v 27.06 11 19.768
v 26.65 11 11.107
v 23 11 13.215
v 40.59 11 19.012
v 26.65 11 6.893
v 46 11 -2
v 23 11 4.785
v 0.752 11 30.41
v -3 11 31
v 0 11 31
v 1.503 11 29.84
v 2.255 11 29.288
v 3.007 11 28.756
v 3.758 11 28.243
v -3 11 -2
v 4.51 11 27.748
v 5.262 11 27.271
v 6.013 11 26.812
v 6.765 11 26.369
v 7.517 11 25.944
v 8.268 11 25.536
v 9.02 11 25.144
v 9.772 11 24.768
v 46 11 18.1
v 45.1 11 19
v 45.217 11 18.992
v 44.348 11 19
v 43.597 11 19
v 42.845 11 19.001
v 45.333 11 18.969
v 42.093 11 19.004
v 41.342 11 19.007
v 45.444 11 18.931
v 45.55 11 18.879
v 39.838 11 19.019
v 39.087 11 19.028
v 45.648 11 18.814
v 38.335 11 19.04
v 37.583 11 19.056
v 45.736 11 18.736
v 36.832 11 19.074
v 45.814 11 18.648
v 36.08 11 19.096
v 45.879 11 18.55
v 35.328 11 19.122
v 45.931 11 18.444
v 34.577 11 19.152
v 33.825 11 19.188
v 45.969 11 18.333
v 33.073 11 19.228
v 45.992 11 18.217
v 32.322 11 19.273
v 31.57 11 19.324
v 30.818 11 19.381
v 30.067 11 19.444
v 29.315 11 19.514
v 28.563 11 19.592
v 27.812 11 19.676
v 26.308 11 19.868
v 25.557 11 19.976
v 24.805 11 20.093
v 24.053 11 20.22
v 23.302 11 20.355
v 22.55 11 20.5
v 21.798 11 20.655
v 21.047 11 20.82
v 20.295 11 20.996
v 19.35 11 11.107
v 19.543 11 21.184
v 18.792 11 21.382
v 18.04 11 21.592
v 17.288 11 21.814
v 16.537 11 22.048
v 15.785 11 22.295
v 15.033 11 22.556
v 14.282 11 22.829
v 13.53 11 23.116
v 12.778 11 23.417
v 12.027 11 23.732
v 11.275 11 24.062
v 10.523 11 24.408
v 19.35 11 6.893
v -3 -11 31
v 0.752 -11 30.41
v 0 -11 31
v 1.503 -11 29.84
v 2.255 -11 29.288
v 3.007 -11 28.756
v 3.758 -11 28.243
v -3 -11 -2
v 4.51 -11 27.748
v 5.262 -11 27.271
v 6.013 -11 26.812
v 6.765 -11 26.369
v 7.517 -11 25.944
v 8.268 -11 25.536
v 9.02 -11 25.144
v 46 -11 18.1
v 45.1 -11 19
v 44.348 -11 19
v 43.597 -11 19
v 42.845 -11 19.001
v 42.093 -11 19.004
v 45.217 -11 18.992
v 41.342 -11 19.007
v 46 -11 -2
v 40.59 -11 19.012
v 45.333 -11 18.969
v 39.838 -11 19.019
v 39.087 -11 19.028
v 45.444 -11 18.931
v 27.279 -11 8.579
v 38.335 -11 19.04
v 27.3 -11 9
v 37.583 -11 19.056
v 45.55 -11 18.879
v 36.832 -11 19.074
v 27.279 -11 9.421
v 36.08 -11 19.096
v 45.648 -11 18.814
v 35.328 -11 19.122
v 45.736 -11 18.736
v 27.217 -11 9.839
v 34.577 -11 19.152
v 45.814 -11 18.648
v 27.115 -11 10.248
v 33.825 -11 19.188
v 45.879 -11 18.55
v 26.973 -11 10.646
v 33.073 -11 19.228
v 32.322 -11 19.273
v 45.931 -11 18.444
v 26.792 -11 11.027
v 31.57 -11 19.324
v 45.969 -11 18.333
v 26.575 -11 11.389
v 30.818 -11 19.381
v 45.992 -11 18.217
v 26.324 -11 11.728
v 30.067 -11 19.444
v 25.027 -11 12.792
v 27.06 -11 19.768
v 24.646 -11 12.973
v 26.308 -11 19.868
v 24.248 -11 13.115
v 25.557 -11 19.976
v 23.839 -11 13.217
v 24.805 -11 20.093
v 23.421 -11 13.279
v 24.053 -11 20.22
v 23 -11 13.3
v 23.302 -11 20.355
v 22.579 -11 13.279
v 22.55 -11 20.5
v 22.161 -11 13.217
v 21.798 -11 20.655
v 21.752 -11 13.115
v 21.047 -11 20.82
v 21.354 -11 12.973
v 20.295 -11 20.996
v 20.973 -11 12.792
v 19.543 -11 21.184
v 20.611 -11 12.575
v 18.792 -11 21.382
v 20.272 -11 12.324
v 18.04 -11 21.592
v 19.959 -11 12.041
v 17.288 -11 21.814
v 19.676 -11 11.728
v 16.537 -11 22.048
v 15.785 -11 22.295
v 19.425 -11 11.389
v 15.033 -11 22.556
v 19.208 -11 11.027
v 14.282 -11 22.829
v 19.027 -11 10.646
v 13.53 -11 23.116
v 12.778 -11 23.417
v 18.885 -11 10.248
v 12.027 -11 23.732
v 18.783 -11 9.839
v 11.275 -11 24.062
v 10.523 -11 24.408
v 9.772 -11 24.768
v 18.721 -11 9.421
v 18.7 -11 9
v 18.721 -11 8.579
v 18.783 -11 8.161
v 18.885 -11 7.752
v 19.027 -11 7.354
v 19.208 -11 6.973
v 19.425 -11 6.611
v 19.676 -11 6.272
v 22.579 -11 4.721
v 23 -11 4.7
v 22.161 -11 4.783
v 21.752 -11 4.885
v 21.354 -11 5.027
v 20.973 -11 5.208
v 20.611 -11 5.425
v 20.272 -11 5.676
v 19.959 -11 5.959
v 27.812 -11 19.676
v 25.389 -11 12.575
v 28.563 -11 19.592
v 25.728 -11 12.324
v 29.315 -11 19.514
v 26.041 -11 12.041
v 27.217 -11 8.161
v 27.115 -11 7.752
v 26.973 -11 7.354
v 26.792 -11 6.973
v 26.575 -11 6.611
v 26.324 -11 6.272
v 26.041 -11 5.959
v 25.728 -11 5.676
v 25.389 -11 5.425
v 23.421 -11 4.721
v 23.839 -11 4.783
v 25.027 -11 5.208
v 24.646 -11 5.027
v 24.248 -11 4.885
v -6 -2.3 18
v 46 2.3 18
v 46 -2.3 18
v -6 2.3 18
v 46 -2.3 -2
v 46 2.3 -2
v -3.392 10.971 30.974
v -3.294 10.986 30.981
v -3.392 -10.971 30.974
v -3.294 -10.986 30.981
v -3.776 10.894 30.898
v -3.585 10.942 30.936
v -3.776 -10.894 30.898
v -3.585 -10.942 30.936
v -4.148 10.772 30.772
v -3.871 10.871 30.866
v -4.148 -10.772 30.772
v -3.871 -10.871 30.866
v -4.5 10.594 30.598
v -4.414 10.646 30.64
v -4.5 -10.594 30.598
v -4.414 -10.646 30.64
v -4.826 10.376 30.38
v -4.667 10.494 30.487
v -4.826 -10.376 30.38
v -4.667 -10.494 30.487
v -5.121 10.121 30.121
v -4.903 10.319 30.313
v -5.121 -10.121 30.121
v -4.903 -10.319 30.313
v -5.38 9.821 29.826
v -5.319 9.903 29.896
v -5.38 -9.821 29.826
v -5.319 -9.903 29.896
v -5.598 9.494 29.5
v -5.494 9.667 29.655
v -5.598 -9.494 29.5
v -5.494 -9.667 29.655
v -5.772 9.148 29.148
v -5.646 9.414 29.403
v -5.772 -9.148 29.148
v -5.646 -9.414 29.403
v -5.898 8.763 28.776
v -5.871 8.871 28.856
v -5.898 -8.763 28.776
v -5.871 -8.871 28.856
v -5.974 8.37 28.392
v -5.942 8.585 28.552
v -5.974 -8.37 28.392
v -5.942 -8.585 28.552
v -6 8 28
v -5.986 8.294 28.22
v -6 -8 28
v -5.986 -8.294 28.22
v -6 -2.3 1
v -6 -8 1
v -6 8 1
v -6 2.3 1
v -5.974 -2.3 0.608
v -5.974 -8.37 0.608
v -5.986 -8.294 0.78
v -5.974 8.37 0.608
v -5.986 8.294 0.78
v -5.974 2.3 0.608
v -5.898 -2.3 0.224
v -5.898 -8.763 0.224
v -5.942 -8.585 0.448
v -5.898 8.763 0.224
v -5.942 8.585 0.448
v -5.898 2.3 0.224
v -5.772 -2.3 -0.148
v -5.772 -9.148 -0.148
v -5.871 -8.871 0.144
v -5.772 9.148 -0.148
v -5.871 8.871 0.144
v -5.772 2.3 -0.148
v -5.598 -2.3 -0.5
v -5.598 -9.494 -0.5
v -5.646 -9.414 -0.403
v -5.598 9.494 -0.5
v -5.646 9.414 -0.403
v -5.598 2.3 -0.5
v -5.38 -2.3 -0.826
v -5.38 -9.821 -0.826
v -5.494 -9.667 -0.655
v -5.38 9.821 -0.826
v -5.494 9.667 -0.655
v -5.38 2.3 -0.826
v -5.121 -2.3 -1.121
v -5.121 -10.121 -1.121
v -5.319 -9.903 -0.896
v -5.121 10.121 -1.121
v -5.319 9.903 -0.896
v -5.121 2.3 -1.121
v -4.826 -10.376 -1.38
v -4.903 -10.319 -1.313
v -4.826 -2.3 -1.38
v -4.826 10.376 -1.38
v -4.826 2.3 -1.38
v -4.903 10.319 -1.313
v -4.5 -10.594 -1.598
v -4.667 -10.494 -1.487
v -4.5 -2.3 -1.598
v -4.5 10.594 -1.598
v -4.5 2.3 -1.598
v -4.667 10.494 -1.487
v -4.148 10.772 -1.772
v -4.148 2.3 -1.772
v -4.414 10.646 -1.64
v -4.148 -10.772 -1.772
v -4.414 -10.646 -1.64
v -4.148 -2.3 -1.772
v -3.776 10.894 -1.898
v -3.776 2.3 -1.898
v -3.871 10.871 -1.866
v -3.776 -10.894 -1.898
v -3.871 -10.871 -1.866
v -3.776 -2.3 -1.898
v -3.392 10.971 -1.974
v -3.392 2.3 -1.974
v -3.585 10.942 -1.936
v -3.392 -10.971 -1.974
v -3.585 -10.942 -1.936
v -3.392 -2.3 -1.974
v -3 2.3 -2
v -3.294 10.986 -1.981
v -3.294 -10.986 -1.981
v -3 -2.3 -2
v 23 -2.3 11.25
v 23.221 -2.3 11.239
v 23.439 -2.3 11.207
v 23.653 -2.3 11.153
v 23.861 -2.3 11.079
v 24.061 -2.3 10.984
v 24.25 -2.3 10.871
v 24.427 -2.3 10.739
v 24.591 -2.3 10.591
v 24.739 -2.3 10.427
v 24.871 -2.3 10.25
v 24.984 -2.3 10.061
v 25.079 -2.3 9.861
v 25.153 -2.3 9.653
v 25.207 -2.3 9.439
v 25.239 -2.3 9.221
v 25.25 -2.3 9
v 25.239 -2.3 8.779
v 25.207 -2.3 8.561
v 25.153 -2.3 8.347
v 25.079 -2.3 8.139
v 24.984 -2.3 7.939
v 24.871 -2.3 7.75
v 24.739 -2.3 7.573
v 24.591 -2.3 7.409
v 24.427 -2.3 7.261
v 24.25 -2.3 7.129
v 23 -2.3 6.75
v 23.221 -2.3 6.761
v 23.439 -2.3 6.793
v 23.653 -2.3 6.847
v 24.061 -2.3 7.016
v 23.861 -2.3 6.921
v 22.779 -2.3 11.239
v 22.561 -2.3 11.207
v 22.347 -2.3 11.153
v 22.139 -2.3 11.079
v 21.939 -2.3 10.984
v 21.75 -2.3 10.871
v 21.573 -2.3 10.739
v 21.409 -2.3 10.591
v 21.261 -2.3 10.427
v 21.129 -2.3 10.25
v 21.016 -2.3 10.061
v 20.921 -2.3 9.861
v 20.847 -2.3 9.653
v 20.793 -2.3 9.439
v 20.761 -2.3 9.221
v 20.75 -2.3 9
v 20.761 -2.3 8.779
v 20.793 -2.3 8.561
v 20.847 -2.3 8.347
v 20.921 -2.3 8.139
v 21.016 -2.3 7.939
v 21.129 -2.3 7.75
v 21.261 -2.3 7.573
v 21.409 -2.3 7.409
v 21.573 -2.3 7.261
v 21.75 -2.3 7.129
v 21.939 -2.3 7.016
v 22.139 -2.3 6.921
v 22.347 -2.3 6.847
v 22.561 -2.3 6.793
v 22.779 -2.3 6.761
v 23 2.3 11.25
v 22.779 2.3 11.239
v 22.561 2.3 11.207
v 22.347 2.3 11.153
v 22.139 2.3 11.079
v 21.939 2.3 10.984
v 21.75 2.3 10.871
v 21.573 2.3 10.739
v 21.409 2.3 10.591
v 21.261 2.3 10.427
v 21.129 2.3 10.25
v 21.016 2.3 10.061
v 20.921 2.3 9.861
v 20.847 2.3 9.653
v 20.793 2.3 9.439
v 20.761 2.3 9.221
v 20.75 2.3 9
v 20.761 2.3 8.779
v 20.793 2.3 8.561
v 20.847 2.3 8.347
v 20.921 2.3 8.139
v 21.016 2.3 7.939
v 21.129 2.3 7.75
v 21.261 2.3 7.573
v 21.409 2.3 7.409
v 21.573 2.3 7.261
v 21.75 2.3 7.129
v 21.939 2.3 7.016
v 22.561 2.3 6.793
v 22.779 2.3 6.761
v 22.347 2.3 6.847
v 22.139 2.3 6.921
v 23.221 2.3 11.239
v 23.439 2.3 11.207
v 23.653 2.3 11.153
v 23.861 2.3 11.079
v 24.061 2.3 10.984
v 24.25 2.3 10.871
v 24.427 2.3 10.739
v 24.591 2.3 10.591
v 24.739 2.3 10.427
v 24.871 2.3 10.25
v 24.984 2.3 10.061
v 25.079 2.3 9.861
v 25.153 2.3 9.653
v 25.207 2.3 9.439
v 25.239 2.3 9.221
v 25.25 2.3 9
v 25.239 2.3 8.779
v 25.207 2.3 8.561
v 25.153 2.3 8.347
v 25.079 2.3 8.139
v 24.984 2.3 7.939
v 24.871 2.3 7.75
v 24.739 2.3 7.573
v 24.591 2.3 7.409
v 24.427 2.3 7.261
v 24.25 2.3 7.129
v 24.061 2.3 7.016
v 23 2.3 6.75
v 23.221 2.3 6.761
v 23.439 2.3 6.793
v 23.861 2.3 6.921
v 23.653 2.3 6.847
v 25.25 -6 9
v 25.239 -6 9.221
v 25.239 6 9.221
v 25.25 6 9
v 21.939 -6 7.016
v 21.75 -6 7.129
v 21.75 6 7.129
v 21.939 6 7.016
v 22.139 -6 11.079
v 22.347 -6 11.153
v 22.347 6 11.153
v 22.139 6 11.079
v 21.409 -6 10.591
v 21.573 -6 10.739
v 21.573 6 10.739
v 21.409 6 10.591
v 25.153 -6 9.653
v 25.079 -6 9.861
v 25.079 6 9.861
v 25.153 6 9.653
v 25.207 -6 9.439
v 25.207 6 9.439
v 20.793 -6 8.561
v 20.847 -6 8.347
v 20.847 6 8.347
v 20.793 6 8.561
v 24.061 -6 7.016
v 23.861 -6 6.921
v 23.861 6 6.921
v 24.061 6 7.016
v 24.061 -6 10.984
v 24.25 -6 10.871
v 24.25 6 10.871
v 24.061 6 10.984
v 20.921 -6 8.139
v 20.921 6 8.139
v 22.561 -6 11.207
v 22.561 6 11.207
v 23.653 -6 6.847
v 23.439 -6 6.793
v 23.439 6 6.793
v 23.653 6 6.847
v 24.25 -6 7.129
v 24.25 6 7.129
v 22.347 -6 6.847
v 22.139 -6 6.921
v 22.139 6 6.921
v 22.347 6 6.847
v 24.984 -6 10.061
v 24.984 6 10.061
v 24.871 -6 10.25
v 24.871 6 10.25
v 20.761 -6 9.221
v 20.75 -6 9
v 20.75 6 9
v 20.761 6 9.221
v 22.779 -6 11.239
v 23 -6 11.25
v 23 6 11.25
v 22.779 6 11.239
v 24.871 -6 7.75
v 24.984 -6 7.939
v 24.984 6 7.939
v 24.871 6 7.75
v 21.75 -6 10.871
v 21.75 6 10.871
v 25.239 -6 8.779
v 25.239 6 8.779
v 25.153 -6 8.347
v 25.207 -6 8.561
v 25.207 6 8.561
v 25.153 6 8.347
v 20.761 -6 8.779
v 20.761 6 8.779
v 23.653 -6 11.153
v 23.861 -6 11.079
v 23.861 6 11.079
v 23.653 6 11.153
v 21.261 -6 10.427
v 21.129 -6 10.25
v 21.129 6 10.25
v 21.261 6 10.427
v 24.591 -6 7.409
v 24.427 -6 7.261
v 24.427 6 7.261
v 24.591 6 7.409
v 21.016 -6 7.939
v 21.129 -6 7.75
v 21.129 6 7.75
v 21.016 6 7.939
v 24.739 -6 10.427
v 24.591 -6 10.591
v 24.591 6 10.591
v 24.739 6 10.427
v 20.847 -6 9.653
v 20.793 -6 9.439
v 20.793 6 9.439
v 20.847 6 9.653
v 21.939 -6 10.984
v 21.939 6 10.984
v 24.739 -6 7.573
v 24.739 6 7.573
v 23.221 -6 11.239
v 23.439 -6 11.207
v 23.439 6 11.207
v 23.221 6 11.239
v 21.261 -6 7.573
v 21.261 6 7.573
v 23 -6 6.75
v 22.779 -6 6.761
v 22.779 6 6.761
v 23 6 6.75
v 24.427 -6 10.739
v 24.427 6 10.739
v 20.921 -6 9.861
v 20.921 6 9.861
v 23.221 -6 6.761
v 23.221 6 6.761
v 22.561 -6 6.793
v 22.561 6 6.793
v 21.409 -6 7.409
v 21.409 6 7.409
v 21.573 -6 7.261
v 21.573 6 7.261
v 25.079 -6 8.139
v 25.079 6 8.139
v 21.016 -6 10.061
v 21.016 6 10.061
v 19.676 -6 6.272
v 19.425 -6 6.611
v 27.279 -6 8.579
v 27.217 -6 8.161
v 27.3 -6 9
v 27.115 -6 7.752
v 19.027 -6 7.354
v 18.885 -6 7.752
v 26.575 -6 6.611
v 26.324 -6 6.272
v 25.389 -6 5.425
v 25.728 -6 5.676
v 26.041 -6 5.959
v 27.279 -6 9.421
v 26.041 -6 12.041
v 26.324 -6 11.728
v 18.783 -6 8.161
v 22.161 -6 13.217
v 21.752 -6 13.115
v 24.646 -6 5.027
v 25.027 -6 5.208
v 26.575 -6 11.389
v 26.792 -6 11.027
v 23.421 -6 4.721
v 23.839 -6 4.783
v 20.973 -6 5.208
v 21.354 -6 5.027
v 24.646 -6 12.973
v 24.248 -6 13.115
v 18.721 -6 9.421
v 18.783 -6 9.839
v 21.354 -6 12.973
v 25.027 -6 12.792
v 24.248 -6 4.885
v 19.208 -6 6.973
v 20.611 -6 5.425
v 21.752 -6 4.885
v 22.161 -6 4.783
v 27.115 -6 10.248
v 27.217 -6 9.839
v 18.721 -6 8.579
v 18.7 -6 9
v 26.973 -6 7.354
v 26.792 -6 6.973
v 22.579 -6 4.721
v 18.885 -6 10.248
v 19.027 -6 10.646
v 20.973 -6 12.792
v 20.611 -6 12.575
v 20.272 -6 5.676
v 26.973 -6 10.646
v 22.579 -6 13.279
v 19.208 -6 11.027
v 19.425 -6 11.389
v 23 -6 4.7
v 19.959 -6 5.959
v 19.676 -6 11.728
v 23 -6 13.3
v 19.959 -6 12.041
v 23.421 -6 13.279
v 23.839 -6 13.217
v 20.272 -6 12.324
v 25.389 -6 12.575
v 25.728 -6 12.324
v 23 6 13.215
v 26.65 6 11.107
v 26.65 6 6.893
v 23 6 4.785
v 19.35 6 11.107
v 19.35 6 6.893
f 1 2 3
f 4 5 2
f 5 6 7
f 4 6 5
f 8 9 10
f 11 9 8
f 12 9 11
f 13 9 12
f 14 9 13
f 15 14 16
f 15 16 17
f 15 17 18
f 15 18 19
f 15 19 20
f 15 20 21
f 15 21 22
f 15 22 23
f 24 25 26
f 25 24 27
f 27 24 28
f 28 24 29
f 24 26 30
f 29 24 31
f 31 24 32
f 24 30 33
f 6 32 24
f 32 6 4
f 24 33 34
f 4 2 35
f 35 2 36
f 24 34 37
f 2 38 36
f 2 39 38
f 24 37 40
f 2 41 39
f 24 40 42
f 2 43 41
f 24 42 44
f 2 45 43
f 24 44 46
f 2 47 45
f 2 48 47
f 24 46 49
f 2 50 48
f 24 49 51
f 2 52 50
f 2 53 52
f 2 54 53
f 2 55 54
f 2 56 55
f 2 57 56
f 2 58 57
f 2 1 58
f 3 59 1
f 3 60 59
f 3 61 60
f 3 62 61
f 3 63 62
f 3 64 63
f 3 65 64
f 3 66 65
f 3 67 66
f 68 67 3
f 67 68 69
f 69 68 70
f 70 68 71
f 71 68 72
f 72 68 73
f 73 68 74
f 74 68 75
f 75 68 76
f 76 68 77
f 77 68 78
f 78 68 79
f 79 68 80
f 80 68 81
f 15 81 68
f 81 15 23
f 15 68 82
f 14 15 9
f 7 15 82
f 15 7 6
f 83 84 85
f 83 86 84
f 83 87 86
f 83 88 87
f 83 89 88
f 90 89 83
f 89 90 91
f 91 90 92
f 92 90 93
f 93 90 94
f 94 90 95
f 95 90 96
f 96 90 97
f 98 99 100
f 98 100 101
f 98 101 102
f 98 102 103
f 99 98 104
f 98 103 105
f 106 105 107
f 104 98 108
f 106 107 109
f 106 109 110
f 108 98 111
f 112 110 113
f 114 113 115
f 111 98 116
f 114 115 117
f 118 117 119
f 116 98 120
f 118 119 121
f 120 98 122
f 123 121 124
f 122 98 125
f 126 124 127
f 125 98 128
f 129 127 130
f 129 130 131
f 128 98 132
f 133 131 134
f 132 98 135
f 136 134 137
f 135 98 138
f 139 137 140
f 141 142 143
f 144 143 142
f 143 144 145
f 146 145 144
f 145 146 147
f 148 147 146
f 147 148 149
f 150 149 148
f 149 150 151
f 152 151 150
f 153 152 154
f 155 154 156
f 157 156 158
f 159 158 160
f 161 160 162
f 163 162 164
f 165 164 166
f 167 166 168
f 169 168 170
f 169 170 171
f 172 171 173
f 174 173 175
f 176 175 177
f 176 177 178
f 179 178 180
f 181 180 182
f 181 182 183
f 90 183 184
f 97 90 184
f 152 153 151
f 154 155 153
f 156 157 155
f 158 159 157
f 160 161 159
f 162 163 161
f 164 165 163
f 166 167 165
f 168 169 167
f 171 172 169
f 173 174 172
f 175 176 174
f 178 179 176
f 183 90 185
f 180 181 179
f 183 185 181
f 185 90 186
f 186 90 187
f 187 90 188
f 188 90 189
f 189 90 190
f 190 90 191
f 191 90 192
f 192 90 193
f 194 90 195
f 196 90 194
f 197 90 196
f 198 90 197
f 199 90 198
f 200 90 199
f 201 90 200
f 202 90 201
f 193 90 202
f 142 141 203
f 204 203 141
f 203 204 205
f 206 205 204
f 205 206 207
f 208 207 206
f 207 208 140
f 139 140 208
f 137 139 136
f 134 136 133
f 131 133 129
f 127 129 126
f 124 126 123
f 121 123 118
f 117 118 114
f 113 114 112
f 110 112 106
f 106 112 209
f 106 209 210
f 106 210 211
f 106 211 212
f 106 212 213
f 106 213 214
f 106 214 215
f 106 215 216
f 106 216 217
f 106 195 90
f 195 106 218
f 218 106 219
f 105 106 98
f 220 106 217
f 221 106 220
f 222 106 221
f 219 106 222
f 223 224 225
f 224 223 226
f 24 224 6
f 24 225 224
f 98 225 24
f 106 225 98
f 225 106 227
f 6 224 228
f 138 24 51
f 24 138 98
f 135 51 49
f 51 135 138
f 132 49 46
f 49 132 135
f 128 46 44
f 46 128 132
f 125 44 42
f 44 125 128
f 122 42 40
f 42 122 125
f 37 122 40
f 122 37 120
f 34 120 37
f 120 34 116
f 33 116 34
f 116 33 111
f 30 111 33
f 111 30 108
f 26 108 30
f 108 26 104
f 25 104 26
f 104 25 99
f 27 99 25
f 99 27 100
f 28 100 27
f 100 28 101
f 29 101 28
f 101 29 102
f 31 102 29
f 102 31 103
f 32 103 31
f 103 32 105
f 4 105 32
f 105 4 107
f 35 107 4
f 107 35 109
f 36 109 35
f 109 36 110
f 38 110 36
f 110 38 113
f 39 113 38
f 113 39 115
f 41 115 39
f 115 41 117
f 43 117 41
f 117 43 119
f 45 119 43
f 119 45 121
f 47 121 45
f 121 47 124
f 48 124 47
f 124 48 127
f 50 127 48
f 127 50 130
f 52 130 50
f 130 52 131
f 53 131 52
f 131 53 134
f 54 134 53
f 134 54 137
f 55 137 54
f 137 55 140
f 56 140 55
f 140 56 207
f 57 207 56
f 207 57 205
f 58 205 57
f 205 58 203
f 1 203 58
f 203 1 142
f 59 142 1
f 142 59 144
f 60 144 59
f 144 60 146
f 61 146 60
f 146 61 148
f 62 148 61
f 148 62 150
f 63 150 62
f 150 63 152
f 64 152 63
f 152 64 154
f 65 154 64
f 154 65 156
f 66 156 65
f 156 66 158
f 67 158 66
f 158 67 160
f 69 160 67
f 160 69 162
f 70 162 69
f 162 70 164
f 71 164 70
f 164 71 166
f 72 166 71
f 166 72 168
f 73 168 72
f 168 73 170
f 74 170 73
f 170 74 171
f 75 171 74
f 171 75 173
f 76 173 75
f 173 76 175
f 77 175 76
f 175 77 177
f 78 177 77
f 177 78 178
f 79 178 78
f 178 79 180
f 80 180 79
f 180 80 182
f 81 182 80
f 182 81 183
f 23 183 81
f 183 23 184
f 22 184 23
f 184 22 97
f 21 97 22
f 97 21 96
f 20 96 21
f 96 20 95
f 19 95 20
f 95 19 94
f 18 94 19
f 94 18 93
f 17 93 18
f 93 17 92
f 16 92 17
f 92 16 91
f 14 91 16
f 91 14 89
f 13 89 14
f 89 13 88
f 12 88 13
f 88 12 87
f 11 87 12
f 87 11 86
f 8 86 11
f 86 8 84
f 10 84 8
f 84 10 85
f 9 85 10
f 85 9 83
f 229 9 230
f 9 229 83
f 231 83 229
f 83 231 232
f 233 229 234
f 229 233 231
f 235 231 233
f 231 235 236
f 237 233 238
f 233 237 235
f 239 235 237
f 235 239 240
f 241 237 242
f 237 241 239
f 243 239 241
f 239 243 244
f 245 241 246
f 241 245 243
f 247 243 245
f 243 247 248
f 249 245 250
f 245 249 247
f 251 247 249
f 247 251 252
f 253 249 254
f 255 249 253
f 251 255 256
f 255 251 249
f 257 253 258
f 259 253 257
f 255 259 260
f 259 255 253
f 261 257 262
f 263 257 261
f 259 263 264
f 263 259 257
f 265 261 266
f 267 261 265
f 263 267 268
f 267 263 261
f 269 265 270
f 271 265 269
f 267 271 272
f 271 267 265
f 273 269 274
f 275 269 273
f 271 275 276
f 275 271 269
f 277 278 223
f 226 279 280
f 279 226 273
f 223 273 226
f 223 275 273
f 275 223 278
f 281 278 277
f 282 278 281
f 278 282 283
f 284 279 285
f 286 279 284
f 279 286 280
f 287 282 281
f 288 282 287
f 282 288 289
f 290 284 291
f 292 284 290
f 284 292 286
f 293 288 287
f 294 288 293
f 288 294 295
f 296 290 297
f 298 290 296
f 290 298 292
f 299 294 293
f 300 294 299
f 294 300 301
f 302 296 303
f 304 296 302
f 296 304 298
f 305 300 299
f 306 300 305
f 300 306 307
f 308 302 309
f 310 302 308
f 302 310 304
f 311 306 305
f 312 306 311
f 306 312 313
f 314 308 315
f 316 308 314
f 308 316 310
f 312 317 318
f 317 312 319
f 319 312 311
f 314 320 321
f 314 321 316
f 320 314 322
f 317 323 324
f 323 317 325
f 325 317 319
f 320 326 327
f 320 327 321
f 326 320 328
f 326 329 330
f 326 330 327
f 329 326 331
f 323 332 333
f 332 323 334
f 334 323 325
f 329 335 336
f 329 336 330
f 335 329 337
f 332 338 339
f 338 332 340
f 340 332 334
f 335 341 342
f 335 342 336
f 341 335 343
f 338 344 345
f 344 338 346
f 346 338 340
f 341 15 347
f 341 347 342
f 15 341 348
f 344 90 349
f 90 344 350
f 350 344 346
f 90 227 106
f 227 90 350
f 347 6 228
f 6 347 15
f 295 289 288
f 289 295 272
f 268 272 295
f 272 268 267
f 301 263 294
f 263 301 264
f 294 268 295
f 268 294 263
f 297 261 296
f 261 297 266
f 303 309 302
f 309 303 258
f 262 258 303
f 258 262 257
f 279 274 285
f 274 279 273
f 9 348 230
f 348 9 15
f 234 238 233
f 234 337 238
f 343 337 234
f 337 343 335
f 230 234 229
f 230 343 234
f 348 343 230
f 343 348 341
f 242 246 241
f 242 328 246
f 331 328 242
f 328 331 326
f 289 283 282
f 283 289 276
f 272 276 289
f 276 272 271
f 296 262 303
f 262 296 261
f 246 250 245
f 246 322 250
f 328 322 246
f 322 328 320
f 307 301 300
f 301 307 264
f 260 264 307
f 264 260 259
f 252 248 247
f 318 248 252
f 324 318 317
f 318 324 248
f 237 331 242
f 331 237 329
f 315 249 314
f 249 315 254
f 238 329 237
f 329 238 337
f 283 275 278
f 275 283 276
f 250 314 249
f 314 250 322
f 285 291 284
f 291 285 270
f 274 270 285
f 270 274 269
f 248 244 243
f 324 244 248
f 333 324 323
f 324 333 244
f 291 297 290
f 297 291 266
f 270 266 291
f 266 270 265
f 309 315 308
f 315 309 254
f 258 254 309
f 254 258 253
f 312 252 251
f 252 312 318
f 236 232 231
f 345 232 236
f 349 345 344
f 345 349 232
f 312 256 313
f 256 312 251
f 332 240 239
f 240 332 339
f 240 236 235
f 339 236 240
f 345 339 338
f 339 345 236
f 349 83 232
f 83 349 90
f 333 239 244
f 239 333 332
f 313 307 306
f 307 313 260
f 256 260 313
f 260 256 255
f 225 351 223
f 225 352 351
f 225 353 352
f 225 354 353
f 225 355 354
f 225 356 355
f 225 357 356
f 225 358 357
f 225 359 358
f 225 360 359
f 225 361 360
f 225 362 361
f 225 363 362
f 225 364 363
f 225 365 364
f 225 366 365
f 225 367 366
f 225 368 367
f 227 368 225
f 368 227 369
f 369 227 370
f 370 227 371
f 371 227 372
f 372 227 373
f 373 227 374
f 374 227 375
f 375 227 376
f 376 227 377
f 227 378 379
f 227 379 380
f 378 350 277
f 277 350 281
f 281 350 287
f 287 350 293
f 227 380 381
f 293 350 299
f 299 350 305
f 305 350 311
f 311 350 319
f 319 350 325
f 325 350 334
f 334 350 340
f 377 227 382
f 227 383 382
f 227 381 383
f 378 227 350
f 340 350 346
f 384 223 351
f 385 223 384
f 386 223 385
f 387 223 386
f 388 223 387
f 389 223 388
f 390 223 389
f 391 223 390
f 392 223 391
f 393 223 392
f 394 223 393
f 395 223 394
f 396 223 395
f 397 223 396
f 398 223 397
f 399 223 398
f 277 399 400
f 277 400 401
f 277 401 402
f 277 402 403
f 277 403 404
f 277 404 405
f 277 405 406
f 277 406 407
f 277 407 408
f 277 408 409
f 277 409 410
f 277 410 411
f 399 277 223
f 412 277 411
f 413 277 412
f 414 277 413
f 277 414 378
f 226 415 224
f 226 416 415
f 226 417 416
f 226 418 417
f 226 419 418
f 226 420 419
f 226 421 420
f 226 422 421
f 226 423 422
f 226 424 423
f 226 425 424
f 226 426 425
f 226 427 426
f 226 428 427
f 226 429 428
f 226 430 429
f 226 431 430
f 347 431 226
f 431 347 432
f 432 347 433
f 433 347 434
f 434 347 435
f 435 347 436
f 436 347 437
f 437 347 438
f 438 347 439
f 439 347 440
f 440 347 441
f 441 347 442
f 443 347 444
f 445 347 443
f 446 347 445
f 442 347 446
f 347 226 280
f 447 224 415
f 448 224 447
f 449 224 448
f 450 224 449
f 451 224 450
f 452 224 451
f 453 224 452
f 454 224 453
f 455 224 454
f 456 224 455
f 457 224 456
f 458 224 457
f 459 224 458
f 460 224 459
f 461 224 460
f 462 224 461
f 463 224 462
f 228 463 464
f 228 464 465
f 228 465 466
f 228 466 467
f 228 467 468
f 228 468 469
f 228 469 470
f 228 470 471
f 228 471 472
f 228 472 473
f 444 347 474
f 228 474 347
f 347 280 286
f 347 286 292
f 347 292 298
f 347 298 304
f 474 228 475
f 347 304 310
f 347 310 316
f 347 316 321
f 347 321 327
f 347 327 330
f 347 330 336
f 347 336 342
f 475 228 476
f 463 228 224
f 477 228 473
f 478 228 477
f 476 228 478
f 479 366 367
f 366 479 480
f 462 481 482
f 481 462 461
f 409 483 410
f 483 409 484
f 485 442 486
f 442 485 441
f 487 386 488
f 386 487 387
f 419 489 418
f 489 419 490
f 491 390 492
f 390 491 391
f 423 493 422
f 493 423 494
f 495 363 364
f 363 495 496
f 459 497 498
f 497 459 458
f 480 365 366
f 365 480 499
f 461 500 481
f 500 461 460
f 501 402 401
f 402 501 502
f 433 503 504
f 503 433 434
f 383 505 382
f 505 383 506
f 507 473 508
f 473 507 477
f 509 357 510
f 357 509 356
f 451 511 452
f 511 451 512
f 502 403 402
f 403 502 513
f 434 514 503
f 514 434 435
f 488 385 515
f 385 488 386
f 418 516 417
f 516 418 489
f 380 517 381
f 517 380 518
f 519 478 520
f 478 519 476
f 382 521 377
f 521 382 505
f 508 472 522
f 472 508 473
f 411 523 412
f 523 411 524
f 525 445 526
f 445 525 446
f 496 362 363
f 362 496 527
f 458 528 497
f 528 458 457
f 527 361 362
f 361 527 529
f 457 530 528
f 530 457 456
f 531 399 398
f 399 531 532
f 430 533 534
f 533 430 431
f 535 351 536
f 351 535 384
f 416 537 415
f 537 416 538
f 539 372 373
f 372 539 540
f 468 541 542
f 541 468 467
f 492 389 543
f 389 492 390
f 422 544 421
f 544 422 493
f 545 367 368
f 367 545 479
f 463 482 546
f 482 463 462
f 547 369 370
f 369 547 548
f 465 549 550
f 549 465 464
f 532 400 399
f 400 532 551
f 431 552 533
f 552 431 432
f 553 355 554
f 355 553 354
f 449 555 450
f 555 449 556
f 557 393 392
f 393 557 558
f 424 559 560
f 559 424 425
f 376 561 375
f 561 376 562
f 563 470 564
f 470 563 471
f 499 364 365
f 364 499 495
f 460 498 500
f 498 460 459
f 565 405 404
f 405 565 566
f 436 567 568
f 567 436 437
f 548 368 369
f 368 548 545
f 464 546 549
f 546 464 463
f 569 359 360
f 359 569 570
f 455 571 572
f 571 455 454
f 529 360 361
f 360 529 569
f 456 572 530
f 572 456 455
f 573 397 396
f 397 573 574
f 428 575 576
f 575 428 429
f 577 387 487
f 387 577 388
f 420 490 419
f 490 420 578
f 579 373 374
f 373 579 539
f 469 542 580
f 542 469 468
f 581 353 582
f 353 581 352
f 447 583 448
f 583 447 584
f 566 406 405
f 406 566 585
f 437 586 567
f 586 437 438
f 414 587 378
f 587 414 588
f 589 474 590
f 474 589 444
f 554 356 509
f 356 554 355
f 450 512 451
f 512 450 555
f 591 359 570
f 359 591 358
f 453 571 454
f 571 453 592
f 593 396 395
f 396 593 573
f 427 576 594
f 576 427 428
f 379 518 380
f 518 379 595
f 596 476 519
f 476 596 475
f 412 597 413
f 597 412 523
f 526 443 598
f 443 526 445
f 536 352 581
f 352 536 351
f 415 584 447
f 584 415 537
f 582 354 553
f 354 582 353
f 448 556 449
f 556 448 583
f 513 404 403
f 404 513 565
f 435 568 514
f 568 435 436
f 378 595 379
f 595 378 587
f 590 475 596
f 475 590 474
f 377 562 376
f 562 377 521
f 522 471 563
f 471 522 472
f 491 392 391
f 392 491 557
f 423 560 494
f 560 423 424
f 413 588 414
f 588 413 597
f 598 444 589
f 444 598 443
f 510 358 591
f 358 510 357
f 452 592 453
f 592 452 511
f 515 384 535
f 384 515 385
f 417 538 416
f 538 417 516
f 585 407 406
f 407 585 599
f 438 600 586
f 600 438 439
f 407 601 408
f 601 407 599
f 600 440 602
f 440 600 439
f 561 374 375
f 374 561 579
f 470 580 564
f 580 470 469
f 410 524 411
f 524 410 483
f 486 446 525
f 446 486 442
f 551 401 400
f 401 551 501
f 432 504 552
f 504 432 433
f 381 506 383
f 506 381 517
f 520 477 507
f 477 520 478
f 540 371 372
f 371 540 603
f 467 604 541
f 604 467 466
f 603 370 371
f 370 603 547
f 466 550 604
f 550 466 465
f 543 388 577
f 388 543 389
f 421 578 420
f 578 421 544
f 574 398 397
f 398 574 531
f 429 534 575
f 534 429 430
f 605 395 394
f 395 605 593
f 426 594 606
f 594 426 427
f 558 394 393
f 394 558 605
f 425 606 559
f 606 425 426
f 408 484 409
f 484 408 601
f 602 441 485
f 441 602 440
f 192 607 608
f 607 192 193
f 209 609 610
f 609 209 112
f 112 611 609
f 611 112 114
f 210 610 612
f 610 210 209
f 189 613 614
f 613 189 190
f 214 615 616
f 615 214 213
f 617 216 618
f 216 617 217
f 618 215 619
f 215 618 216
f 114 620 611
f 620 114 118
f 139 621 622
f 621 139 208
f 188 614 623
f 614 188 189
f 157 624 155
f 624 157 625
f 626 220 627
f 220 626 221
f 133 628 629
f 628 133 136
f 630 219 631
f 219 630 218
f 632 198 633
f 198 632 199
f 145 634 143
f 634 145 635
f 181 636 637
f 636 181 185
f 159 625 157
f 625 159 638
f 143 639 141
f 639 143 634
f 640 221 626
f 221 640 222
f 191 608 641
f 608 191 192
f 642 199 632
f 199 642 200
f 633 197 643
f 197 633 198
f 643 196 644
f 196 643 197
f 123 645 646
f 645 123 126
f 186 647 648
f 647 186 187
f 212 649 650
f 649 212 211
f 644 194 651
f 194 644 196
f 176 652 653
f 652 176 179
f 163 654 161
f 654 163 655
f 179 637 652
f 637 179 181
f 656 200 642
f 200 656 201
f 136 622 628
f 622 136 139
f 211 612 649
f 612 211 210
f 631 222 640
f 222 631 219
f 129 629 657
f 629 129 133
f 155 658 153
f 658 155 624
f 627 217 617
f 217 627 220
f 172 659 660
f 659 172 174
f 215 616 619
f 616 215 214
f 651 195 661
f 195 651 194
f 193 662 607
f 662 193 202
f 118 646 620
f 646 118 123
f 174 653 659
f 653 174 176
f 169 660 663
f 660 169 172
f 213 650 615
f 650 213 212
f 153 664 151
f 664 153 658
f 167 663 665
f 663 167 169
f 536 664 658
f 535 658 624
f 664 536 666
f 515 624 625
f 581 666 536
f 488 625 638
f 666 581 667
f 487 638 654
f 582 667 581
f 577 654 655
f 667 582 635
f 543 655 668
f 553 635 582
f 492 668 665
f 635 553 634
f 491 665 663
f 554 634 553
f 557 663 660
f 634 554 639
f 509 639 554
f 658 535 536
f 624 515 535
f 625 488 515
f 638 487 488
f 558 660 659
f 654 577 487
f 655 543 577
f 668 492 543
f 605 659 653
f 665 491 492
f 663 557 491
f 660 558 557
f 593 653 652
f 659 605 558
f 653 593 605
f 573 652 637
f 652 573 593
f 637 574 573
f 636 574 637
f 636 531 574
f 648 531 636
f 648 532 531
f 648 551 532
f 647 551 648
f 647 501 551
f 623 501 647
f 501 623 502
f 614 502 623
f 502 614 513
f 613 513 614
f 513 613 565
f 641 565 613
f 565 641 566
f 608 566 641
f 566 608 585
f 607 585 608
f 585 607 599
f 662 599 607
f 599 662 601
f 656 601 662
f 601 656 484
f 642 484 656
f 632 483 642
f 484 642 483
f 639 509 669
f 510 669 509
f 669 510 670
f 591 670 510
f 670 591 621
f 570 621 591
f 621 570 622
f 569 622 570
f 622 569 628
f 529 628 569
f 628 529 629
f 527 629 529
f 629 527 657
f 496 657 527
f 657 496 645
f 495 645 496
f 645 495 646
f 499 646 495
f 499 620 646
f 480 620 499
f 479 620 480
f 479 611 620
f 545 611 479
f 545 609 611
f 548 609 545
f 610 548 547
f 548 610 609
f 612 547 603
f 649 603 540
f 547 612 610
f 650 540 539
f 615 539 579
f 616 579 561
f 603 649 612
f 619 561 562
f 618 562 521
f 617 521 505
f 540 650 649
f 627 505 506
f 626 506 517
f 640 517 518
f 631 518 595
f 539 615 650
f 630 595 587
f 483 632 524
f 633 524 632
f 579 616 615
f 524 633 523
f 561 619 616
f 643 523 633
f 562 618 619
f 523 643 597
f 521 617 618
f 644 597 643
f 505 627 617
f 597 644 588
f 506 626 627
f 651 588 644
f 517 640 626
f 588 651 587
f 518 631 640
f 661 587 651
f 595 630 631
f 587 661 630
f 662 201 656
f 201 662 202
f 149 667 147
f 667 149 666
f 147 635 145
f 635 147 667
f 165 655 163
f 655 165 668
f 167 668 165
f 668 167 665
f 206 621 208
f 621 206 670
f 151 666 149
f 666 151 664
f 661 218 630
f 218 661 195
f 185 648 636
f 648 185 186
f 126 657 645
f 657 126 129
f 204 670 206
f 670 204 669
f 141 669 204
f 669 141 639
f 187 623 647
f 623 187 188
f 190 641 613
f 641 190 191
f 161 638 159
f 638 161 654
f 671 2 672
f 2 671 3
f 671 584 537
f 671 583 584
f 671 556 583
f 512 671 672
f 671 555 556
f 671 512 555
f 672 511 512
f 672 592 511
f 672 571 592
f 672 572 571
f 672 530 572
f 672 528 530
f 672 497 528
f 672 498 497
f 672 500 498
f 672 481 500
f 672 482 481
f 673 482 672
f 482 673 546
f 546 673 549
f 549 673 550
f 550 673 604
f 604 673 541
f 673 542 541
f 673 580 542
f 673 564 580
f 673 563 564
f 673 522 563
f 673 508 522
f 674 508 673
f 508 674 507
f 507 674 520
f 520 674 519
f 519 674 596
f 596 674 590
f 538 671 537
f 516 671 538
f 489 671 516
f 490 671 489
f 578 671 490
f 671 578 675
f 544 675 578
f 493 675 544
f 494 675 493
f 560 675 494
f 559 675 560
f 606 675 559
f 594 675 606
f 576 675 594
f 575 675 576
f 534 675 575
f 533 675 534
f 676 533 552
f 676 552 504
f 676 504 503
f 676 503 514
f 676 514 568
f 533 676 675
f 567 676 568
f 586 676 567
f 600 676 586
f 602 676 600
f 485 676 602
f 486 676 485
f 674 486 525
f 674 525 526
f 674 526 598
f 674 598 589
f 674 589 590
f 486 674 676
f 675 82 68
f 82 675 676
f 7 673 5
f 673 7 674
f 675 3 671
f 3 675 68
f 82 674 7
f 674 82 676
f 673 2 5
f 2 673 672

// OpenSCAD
// Batente v8 para a ponta do suporte das cadeiras (OpenSCAD)
// Eixos: X ao longo do suporte (X=0 na ponta, cresce para dentro do suporte),
//        Y na largura (centrado), Z para cima (Z=0 no fundo do canal).
// Medidas em mm. Parafuso M4 x 16 + porca M4. Cavidades com o formato exato.
// O suporte nao tem paredes externas: a peca tem 22 mm de largura em todos os pontos.
// v8: garras 10 mm mais longas, base 2 mm mais baixa (sem folga), parede 5 mm mais baixa,
//     rampa mais fina com 1 mm de material no fim, curva que cai rente a parede e ponta suave.

$fn = 64;

// ---------- Medidas do suporte ----------
LARG      = 22;     // largura total (tambem a largura da peca)
DIV       = 3;      // divisao do meio
ALT_CANAL = 18;     // altura do canal
FURO_X    = 23;     // centro do furo de 5 mm, a partir da ponta

// ---------- Parametros da peca ----------
FOLGA      = 0.3;   // folga de encaixe para impressao 3D
ESP_PAREDE = 6;     // espessura da parede na ponta (X de -6 a 0)
ALT_PAREDE = 13;    // altura da parede acima do canal (era 18)
COMP_GARRA = 46;    // comprimento das garras dentro dos canais (era 36)
BASE_EXTRA = 2;     // a peca desce 2 mm alem do fundo antigo, para eliminar a folga na base
FOLGA_SULCO = 0.5;  // folga extra de cada lado do sulco (sulco 1 mm mais largo)
R_BORDA    = 3;     // raio do arredondamento das bordas da face externa da parede
H_FIM      = 1.0;   // espessura da rampa no fim, acima das garras (evita falta de material)
R_NARIZ    = 0.9;   // raio do arredondamento da ponta da rampa (ponta suave, sem quina)
P_CURVA    = 3;     // forca da curva: maior = cai mais rapido junto da parede

// ---------- Parafuso M4 x 16 e porca M4 ----------
FURO_D     = 4.5;   // furo passante M4
CABECA_D   = 8.6;   // cabeca panela M4 (8,0) + folga
CABECA_PROF = 5.0;  // cabeca panela (3,1) ou cilindrica (4,0) fica rebaixada
PORCA_AF   = 7.3;   // porca M4: 7,0 entre faces + folga
PORCA_PROF = 5.0;   // porca M4 (3,2) encostada no fundo; M4x16 atravessa a porca inteira

// ---------- Derivados ----------
VAO        = DIV + 2*FOLGA + 2*FOLGA_SULCO; // sulco central onde passa a divisao (4,6 mm)
LARG_GARRA = (LARG - VAO) / 2;          // cada garra vai da borda de 22 mm ate o vao
Y_CENTRO   = VAO/2 + LARG_GARRA/2;      // centro de cada garra
Y_EXT      = LARG/2;                    // face externa da garra (|Y| = 11)
Z_FURO     = ALT_CANAL/2;               // altura do furo, igual a v7 (ja estava certo)
R_PORCA    = PORCA_AF / sqrt(3);        // raio circunscrito do sextavado
TOPO       = ALT_CANAL + ALT_PAREDE;

// ---------- Perfil lateral: parede + rampa concava que cai rente a parede ----------
N = 60;
LC = COMP_GARRA - R_NARIZ;               // comprimento da curva, antes da ponta arredondada
// espessura da rampa acima das garras: cai rapido junto da parede e acaba plana
rampa = [ for (i = [0:N]) let(t = i/N)
          [ LC*t, ALT_CANAL + H_FIM + (ALT_PAREDE - H_FIM)*pow(1 - t, P_CURVA) ] ];

function arco(cx, cz, r, a0, a1) = [ for (i = [0:12]) let(a = a0 + (a1 - a0)*i/12)
                                     [ cx + r*cos(a), cz + r*sin(a) ] ];
perfil = concat([[0, -BASE_EXTRA]],
                arco(-ESP_PAREDE + R_BORDA, -BASE_EXTRA + R_BORDA, R_BORDA, 270, 180),  // canto de baixo
                arco(-ESP_PAREDE + R_BORDA, TOPO - R_BORDA, R_BORDA, 180, 90),          // canto de cima
                rampa,
                arco(LC, ALT_CANAL + H_FIM - R_NARIZ, R_NARIZ, 90, 0),                  // ponta suave
                [[COMP_GARRA, ALT_CANAL], [0, ALT_CANAL]]);

module cabeca() {
    // perfil em XZ extrudado ao longo de Y, centrado; a planta arredonda as duas
    // quinas verticais da face externa da parede
    intersection() {
        rotate([90, 0, 0]) linear_extrude(height = LARG, center = true) polygon(perfil);
        translate([0, 0, -BASE_EXTRA - 1]) linear_extrude(height = TOPO + BASE_EXTRA + 2) hull() {
            translate([-ESP_PAREDE + R_BORDA, -LARG/2])
                square([ESP_PAREDE + COMP_GARRA - R_BORDA, LARG]);
            for (lado = [-1, 1])
                translate([-ESP_PAREDE + R_BORDA, lado*(LARG/2 - R_BORDA)]) circle(r = R_BORDA);
        }
    }
}

module garra(y0, y1) {
    // garra reta entre y0 e y1; entra 0,5 mm na parede para soldar no mesmo corpo
    translate([-0.5, y0, -BASE_EXTRA]) cube([COMP_GARRA + 0.5, y1 - y0, ALT_CANAL + BASE_EXTRA]);
}

module garras() {
    // duas garras que somam 22 mm de largura, com o sulco no meio
    garra(-Y_EXT, -VAO/2);
    garra(VAO/2, Y_EXT);
}

module sulco_passante() {
    // sulco central de ponta a ponta: atravessa tambem a parede da ponta
    translate([-ESP_PAREDE - 1, -VAO/2, -BASE_EXTRA - 1])
        cube([ESP_PAREDE + COMP_GARRA + 2, VAO, ALT_CANAL + BASE_EXTRA + 1]);
}

module furo_parafuso() {
    translate([FURO_X, 0, Z_FURO]) rotate([90, 0, 0])
        cylinder(d = FURO_D, h = LARG + 4, center = true);
}

module rebaixo_cabeca() {   // cilindro exato, no lado -Y
    translate([FURO_X, -Y_EXT - 0.01, Z_FURO]) rotate([-90, 0, 0])
        cylinder(d = CABECA_D, h = CABECA_PROF + 0.01);
}

module sextavado_porca() {  // sextavado exato, no lado +Y
    translate([FURO_X, Y_EXT + 0.01, Z_FURO]) rotate([90, 0, 0])
        rotate([0, 0, 30])  // cantos para cima/baixo, faces planas nas laterais
            cylinder(r = R_PORCA, h = PORCA_PROF + 0.01, $fn = 6);
}

difference() {
    union() { cabeca(); garras(); }
    sulco_passante();
    furo_parafuso();
    rebaixo_cabeca();
    sextavado_porca();
}
